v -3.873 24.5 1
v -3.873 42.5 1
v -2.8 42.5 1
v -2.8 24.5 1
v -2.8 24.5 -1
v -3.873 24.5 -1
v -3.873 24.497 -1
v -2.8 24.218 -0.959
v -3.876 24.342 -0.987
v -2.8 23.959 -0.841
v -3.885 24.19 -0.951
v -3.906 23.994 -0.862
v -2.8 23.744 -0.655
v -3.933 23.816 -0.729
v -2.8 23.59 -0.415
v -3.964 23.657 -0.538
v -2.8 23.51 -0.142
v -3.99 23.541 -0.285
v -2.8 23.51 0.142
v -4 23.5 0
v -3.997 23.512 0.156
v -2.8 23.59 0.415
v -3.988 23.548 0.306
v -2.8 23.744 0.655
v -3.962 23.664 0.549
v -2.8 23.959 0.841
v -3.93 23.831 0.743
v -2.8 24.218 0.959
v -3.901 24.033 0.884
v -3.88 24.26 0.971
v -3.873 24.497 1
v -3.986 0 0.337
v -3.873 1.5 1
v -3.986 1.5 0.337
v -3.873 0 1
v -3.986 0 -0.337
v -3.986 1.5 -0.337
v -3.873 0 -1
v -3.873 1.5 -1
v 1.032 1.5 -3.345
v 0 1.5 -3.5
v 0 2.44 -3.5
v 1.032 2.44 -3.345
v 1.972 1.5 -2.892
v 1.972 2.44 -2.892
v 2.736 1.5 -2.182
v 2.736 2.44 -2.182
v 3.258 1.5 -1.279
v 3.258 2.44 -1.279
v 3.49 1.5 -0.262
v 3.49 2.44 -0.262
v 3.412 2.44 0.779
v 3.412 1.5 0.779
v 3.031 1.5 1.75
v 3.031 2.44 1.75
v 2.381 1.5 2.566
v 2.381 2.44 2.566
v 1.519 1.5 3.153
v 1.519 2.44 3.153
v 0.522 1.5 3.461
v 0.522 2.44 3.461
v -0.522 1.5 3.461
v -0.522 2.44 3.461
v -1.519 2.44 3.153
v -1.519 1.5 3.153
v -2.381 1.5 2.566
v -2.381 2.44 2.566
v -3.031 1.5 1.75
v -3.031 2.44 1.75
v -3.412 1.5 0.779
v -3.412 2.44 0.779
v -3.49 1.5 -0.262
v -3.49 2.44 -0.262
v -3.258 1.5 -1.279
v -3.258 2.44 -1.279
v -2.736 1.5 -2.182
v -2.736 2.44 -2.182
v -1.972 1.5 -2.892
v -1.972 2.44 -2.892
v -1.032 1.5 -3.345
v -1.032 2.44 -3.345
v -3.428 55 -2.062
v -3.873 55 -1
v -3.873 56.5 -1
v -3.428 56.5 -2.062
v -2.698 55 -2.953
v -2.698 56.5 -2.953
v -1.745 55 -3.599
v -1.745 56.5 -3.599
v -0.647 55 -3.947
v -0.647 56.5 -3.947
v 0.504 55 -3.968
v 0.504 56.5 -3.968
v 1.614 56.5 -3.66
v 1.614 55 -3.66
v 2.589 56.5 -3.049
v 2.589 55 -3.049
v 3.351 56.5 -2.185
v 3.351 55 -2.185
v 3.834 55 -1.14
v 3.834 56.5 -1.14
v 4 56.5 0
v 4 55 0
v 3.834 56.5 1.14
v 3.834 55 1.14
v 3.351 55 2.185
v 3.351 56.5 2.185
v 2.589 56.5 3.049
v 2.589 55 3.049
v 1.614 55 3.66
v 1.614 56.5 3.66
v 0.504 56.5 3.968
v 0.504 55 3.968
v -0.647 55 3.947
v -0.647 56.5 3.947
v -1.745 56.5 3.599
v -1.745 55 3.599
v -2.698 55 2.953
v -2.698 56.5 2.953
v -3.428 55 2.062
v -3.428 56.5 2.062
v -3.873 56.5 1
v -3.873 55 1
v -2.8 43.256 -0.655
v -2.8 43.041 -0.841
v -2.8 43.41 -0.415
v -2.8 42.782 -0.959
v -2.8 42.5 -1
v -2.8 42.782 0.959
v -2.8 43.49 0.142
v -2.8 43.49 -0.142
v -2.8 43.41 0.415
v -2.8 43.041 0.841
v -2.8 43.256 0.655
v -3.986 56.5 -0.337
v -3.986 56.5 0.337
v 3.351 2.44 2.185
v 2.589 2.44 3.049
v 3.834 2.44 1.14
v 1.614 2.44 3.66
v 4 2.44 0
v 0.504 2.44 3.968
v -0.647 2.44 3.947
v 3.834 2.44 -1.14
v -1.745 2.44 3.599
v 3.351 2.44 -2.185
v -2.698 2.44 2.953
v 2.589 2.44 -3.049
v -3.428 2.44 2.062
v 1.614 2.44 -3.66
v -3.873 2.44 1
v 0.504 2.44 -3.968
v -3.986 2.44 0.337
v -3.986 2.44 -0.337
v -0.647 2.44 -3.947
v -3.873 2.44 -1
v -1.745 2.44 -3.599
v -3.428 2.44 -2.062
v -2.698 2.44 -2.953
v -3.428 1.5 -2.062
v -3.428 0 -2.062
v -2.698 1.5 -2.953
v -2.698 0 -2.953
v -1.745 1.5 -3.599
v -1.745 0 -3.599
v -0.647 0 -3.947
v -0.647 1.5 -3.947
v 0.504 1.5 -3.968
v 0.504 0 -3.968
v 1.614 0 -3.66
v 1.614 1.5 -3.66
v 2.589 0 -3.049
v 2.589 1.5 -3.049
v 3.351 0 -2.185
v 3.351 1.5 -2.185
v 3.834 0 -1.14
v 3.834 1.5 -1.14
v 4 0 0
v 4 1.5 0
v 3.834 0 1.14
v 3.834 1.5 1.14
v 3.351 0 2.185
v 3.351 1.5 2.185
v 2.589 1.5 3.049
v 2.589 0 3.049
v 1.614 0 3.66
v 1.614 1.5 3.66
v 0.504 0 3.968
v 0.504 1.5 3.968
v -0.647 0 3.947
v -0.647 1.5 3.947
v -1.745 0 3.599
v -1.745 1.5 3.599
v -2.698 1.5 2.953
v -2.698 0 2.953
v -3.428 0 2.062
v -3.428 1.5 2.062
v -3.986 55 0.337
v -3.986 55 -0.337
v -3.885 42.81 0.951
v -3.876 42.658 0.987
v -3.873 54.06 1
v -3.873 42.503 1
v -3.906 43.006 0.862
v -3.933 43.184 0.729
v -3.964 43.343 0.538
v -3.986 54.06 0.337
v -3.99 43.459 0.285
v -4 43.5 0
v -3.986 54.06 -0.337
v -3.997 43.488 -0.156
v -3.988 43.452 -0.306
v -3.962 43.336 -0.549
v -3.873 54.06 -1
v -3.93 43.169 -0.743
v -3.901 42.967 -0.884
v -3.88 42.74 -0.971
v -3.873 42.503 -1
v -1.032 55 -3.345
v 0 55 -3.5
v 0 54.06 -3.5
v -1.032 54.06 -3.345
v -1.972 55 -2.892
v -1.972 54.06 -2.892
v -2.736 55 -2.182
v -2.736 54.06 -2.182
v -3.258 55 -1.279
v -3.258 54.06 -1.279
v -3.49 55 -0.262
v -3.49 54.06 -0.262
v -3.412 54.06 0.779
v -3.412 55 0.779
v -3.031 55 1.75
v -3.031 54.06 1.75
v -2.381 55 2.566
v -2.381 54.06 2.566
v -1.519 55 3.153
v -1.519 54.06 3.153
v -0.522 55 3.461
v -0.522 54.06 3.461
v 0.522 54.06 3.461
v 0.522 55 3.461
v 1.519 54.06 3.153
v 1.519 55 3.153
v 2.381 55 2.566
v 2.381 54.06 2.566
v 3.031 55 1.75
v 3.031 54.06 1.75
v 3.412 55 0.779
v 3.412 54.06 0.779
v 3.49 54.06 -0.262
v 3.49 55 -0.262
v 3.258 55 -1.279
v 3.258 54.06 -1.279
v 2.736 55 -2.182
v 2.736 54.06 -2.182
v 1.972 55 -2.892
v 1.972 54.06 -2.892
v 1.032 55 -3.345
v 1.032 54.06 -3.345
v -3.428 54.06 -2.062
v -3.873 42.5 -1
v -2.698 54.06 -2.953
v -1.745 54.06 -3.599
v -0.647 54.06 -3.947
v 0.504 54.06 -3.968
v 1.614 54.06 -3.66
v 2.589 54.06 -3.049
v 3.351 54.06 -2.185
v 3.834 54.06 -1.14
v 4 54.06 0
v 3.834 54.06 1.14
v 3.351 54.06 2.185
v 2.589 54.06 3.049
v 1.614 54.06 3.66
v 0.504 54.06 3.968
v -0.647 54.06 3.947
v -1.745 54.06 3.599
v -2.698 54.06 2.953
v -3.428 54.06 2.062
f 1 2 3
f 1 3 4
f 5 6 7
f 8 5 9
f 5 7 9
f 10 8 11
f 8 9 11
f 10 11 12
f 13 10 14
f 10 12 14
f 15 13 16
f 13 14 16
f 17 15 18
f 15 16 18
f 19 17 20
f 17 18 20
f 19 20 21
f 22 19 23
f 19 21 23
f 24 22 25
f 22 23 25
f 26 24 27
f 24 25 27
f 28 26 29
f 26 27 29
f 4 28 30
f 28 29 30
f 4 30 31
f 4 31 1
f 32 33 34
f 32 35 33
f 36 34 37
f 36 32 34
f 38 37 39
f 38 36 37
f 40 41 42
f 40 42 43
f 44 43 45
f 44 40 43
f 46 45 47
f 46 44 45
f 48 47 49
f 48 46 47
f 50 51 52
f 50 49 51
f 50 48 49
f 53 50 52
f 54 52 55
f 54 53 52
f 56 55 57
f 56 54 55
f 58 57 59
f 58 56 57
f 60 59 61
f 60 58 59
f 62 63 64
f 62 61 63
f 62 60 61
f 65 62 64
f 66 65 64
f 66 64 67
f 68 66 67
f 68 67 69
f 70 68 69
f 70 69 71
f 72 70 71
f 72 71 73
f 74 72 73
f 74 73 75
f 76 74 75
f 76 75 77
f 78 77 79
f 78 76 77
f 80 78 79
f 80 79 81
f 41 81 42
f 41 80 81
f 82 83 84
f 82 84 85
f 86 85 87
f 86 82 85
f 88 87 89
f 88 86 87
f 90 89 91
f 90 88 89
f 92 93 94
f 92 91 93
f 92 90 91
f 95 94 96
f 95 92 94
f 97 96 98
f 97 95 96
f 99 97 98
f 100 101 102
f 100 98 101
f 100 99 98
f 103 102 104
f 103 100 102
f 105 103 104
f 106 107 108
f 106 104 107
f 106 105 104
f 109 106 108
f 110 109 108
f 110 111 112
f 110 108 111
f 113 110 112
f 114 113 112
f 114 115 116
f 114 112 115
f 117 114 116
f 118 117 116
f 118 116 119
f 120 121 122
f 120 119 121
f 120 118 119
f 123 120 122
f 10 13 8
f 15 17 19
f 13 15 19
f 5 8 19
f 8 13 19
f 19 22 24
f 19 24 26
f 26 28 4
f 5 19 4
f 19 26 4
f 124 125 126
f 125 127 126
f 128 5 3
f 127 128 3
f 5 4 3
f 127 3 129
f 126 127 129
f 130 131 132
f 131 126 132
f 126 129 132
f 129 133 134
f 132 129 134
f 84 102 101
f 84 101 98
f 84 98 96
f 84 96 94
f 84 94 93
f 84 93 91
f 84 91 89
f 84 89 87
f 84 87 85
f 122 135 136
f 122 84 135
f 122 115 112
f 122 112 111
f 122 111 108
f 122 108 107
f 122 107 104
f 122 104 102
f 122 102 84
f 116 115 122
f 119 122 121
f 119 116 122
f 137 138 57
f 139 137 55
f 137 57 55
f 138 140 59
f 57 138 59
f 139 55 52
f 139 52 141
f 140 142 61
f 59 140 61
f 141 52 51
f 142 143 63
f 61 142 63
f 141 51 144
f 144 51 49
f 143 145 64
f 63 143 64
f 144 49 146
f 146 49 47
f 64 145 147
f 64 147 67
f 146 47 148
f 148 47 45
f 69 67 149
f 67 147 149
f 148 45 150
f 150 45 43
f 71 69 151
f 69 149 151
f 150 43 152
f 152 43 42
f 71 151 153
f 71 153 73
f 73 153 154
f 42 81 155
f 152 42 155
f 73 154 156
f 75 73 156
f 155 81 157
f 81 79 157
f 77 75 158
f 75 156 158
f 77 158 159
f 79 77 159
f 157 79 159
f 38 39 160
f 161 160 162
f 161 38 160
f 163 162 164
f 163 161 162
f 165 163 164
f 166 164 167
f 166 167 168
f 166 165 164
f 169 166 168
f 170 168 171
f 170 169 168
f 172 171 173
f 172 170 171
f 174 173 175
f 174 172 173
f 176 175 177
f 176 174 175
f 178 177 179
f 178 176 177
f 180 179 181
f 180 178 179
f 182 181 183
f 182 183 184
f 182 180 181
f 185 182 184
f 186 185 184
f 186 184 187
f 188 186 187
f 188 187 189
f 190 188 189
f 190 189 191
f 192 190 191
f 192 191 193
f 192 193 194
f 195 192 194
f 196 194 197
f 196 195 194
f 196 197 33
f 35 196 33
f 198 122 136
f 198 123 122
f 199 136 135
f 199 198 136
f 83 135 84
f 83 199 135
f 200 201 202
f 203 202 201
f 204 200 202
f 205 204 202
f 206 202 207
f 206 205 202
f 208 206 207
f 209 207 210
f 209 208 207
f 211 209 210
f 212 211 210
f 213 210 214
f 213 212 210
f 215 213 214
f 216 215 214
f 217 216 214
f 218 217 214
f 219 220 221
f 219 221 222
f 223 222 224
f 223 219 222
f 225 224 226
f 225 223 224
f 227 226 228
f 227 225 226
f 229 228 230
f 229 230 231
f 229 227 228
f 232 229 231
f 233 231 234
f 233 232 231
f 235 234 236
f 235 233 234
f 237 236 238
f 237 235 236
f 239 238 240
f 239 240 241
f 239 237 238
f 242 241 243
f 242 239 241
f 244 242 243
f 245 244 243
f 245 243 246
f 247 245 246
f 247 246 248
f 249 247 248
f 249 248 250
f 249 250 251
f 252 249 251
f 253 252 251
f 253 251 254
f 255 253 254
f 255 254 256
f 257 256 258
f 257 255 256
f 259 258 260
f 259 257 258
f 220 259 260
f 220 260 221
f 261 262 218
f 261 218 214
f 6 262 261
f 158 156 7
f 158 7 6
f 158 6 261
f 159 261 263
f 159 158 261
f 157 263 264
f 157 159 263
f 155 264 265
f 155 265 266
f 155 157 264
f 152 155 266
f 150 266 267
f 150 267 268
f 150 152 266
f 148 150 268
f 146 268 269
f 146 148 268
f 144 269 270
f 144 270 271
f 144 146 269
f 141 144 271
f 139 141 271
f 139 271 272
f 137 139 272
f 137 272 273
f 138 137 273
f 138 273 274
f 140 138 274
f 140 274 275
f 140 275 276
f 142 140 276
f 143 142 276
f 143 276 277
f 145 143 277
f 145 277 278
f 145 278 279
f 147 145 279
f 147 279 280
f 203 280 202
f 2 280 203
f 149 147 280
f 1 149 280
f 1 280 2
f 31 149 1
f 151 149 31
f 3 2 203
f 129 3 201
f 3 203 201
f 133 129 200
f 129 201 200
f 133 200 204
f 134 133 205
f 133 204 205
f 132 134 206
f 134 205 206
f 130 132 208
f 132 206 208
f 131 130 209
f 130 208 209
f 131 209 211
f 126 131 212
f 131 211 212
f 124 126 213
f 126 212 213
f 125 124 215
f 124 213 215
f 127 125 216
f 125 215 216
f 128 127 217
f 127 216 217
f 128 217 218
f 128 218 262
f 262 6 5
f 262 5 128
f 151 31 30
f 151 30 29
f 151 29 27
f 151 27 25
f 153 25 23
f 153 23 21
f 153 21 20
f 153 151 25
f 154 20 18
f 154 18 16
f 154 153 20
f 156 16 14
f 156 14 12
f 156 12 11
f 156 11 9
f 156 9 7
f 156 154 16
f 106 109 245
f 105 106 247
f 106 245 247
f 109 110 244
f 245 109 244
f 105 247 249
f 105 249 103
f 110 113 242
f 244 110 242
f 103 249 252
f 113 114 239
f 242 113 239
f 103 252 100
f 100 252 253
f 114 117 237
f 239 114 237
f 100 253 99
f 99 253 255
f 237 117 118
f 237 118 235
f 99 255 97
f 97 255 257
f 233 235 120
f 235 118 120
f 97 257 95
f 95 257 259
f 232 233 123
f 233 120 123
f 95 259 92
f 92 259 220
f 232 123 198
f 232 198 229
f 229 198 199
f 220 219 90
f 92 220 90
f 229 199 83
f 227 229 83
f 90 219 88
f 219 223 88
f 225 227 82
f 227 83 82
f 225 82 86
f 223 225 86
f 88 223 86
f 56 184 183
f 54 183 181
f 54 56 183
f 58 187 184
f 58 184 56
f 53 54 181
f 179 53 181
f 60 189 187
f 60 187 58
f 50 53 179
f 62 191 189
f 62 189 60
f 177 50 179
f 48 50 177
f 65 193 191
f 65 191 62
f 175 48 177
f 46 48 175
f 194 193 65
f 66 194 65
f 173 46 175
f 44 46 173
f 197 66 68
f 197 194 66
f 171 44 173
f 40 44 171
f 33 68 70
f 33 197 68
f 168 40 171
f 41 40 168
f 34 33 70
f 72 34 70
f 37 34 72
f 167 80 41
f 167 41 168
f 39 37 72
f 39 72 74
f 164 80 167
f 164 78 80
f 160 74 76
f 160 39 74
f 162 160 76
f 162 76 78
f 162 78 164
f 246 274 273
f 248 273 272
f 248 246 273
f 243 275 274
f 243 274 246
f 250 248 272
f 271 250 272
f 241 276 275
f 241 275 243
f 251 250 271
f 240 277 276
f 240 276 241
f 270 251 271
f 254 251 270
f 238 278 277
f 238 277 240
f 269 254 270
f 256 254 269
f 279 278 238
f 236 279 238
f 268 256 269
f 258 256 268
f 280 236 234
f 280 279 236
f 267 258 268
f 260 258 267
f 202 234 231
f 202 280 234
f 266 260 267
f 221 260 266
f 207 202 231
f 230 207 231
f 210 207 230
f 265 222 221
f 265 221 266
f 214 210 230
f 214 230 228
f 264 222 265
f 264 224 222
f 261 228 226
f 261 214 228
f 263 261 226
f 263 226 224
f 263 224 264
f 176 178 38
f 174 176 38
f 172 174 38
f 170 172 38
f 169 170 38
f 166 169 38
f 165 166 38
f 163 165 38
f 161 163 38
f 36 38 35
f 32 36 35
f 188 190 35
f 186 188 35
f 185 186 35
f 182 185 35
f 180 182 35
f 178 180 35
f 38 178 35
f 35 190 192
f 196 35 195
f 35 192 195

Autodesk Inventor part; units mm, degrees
ref_plane "XZ Plane" through (0, 0, 0) normal (0, 1, 0) x (-1, 0, 0)
ref_plane "XY Plane" through (0, 0, 0) normal (0, 0, 1) x (1, 0, 0)
sketch "Sketch1" plane through (0, 0, 0) normal (0, 1, 0) x (-1, 0, 0)
  arc A0 (3.873, 1) -> (3.873, -1) centre (0, 0) ccw
  circle A1 centre (0, 0) radius 4
  dimension "d0" = 8
extrude "Extrusion1" add sketch "Sketch1" along normal blind 56.5
sketch "Sketch2" plane through (0, 0, 0) normal (1, 0, 0) x (0, 1, 0)
  line L0 (1.5, -6.5) -> (2.44, -6.5)
  line L1 (2.44, -6.5) -> (2.44, -3.5)
  line L2 (2.44, -3.5) -> (1.5, -3.5)
  line L3 (1.5, -3.5) -> (1.5, -6.5)
  line L4 (0, -4) -> (56.5, -4) projected
  line L5 (0, -4) -> (56.5, -4) projected
  line L6 (0, -4) -> (56.5, -4) projected
  line L7 (0, -4) -> (0, 4) projected
  line L8 (28.25, -4) -> (28.25, 9.3026)
  line L9 (55, -6.5) -> (54.06, -6.5)
  line L10 (54.06, -6.5) -> (54.06, -3.5)
  line L11 (54.06, -3.5) -> (55, -3.5)
  line L12 (55, -3.5) -> (55, -6.5)
  line L13 (56.5, -4) -> (56.5, 4)
  line L14 (-11.3, 0) -> (67.8, 0) projected
  point P0 (0, 0)
  point P1 (0, 1)
  point P2 (0, -1)
  point P3 (56.5, 0)
  point P4 (56.5, 1)
  point P5 (56.5, -1)
  dimension "d9" = 0.94
  dimension "d10" = 0.5
  dimension "d11" = 3
  dimension "d12" = 1.5
revolve "Revolution1" cut sketch "Sketch2" angle 360 about axis through (0, -10, 0) along (0, 1, 0) contours L3 L4 L1 L0 | L3 L2 L1 L4 | L10 L11 L12 L4 | L4 L12 L9 L10
ref_plane "Work Plane1" through (-4, 0, 0) normal (1, 0, 0) x (0, 1, 0)
sketch "Sketch5" plane through (-4, 0, 0) normal (1, 0, 0) x (0, 1, 0)
  line L0 (42.5, 1) -> (24.5, 1)
  line L1 (24.5, 1) -> (24.5, -1)
  line L2 (24.5, -1) -> (42.5, -1)
  line L3 (42.5, -1) -> (42.5, 1)
  circle A0 centre (24.5, 0) radius 1
  circle A1 centre (42.5, 0) radius 1
  line L4 (2.44, -4) -> (54.06, -4) projected
  line L5 (2.44, 4) -> (54.06, 4) projected
  line L6 (56.5, -4) -> (56.5, 4) projected
  line L7 (0, 4) -> (0, -4) projected
  point P0 (0, 0)
  dimension "d19" = 2
  dimension "d20" = 3
  dimension "d23" = 18
  dimension "d25" = 14
extrude "Extrusion4" cut sketch "Sketch5" along normal blind 1.2
properties part number "AxeVerticalCaptif" material "Stainless Steel"
